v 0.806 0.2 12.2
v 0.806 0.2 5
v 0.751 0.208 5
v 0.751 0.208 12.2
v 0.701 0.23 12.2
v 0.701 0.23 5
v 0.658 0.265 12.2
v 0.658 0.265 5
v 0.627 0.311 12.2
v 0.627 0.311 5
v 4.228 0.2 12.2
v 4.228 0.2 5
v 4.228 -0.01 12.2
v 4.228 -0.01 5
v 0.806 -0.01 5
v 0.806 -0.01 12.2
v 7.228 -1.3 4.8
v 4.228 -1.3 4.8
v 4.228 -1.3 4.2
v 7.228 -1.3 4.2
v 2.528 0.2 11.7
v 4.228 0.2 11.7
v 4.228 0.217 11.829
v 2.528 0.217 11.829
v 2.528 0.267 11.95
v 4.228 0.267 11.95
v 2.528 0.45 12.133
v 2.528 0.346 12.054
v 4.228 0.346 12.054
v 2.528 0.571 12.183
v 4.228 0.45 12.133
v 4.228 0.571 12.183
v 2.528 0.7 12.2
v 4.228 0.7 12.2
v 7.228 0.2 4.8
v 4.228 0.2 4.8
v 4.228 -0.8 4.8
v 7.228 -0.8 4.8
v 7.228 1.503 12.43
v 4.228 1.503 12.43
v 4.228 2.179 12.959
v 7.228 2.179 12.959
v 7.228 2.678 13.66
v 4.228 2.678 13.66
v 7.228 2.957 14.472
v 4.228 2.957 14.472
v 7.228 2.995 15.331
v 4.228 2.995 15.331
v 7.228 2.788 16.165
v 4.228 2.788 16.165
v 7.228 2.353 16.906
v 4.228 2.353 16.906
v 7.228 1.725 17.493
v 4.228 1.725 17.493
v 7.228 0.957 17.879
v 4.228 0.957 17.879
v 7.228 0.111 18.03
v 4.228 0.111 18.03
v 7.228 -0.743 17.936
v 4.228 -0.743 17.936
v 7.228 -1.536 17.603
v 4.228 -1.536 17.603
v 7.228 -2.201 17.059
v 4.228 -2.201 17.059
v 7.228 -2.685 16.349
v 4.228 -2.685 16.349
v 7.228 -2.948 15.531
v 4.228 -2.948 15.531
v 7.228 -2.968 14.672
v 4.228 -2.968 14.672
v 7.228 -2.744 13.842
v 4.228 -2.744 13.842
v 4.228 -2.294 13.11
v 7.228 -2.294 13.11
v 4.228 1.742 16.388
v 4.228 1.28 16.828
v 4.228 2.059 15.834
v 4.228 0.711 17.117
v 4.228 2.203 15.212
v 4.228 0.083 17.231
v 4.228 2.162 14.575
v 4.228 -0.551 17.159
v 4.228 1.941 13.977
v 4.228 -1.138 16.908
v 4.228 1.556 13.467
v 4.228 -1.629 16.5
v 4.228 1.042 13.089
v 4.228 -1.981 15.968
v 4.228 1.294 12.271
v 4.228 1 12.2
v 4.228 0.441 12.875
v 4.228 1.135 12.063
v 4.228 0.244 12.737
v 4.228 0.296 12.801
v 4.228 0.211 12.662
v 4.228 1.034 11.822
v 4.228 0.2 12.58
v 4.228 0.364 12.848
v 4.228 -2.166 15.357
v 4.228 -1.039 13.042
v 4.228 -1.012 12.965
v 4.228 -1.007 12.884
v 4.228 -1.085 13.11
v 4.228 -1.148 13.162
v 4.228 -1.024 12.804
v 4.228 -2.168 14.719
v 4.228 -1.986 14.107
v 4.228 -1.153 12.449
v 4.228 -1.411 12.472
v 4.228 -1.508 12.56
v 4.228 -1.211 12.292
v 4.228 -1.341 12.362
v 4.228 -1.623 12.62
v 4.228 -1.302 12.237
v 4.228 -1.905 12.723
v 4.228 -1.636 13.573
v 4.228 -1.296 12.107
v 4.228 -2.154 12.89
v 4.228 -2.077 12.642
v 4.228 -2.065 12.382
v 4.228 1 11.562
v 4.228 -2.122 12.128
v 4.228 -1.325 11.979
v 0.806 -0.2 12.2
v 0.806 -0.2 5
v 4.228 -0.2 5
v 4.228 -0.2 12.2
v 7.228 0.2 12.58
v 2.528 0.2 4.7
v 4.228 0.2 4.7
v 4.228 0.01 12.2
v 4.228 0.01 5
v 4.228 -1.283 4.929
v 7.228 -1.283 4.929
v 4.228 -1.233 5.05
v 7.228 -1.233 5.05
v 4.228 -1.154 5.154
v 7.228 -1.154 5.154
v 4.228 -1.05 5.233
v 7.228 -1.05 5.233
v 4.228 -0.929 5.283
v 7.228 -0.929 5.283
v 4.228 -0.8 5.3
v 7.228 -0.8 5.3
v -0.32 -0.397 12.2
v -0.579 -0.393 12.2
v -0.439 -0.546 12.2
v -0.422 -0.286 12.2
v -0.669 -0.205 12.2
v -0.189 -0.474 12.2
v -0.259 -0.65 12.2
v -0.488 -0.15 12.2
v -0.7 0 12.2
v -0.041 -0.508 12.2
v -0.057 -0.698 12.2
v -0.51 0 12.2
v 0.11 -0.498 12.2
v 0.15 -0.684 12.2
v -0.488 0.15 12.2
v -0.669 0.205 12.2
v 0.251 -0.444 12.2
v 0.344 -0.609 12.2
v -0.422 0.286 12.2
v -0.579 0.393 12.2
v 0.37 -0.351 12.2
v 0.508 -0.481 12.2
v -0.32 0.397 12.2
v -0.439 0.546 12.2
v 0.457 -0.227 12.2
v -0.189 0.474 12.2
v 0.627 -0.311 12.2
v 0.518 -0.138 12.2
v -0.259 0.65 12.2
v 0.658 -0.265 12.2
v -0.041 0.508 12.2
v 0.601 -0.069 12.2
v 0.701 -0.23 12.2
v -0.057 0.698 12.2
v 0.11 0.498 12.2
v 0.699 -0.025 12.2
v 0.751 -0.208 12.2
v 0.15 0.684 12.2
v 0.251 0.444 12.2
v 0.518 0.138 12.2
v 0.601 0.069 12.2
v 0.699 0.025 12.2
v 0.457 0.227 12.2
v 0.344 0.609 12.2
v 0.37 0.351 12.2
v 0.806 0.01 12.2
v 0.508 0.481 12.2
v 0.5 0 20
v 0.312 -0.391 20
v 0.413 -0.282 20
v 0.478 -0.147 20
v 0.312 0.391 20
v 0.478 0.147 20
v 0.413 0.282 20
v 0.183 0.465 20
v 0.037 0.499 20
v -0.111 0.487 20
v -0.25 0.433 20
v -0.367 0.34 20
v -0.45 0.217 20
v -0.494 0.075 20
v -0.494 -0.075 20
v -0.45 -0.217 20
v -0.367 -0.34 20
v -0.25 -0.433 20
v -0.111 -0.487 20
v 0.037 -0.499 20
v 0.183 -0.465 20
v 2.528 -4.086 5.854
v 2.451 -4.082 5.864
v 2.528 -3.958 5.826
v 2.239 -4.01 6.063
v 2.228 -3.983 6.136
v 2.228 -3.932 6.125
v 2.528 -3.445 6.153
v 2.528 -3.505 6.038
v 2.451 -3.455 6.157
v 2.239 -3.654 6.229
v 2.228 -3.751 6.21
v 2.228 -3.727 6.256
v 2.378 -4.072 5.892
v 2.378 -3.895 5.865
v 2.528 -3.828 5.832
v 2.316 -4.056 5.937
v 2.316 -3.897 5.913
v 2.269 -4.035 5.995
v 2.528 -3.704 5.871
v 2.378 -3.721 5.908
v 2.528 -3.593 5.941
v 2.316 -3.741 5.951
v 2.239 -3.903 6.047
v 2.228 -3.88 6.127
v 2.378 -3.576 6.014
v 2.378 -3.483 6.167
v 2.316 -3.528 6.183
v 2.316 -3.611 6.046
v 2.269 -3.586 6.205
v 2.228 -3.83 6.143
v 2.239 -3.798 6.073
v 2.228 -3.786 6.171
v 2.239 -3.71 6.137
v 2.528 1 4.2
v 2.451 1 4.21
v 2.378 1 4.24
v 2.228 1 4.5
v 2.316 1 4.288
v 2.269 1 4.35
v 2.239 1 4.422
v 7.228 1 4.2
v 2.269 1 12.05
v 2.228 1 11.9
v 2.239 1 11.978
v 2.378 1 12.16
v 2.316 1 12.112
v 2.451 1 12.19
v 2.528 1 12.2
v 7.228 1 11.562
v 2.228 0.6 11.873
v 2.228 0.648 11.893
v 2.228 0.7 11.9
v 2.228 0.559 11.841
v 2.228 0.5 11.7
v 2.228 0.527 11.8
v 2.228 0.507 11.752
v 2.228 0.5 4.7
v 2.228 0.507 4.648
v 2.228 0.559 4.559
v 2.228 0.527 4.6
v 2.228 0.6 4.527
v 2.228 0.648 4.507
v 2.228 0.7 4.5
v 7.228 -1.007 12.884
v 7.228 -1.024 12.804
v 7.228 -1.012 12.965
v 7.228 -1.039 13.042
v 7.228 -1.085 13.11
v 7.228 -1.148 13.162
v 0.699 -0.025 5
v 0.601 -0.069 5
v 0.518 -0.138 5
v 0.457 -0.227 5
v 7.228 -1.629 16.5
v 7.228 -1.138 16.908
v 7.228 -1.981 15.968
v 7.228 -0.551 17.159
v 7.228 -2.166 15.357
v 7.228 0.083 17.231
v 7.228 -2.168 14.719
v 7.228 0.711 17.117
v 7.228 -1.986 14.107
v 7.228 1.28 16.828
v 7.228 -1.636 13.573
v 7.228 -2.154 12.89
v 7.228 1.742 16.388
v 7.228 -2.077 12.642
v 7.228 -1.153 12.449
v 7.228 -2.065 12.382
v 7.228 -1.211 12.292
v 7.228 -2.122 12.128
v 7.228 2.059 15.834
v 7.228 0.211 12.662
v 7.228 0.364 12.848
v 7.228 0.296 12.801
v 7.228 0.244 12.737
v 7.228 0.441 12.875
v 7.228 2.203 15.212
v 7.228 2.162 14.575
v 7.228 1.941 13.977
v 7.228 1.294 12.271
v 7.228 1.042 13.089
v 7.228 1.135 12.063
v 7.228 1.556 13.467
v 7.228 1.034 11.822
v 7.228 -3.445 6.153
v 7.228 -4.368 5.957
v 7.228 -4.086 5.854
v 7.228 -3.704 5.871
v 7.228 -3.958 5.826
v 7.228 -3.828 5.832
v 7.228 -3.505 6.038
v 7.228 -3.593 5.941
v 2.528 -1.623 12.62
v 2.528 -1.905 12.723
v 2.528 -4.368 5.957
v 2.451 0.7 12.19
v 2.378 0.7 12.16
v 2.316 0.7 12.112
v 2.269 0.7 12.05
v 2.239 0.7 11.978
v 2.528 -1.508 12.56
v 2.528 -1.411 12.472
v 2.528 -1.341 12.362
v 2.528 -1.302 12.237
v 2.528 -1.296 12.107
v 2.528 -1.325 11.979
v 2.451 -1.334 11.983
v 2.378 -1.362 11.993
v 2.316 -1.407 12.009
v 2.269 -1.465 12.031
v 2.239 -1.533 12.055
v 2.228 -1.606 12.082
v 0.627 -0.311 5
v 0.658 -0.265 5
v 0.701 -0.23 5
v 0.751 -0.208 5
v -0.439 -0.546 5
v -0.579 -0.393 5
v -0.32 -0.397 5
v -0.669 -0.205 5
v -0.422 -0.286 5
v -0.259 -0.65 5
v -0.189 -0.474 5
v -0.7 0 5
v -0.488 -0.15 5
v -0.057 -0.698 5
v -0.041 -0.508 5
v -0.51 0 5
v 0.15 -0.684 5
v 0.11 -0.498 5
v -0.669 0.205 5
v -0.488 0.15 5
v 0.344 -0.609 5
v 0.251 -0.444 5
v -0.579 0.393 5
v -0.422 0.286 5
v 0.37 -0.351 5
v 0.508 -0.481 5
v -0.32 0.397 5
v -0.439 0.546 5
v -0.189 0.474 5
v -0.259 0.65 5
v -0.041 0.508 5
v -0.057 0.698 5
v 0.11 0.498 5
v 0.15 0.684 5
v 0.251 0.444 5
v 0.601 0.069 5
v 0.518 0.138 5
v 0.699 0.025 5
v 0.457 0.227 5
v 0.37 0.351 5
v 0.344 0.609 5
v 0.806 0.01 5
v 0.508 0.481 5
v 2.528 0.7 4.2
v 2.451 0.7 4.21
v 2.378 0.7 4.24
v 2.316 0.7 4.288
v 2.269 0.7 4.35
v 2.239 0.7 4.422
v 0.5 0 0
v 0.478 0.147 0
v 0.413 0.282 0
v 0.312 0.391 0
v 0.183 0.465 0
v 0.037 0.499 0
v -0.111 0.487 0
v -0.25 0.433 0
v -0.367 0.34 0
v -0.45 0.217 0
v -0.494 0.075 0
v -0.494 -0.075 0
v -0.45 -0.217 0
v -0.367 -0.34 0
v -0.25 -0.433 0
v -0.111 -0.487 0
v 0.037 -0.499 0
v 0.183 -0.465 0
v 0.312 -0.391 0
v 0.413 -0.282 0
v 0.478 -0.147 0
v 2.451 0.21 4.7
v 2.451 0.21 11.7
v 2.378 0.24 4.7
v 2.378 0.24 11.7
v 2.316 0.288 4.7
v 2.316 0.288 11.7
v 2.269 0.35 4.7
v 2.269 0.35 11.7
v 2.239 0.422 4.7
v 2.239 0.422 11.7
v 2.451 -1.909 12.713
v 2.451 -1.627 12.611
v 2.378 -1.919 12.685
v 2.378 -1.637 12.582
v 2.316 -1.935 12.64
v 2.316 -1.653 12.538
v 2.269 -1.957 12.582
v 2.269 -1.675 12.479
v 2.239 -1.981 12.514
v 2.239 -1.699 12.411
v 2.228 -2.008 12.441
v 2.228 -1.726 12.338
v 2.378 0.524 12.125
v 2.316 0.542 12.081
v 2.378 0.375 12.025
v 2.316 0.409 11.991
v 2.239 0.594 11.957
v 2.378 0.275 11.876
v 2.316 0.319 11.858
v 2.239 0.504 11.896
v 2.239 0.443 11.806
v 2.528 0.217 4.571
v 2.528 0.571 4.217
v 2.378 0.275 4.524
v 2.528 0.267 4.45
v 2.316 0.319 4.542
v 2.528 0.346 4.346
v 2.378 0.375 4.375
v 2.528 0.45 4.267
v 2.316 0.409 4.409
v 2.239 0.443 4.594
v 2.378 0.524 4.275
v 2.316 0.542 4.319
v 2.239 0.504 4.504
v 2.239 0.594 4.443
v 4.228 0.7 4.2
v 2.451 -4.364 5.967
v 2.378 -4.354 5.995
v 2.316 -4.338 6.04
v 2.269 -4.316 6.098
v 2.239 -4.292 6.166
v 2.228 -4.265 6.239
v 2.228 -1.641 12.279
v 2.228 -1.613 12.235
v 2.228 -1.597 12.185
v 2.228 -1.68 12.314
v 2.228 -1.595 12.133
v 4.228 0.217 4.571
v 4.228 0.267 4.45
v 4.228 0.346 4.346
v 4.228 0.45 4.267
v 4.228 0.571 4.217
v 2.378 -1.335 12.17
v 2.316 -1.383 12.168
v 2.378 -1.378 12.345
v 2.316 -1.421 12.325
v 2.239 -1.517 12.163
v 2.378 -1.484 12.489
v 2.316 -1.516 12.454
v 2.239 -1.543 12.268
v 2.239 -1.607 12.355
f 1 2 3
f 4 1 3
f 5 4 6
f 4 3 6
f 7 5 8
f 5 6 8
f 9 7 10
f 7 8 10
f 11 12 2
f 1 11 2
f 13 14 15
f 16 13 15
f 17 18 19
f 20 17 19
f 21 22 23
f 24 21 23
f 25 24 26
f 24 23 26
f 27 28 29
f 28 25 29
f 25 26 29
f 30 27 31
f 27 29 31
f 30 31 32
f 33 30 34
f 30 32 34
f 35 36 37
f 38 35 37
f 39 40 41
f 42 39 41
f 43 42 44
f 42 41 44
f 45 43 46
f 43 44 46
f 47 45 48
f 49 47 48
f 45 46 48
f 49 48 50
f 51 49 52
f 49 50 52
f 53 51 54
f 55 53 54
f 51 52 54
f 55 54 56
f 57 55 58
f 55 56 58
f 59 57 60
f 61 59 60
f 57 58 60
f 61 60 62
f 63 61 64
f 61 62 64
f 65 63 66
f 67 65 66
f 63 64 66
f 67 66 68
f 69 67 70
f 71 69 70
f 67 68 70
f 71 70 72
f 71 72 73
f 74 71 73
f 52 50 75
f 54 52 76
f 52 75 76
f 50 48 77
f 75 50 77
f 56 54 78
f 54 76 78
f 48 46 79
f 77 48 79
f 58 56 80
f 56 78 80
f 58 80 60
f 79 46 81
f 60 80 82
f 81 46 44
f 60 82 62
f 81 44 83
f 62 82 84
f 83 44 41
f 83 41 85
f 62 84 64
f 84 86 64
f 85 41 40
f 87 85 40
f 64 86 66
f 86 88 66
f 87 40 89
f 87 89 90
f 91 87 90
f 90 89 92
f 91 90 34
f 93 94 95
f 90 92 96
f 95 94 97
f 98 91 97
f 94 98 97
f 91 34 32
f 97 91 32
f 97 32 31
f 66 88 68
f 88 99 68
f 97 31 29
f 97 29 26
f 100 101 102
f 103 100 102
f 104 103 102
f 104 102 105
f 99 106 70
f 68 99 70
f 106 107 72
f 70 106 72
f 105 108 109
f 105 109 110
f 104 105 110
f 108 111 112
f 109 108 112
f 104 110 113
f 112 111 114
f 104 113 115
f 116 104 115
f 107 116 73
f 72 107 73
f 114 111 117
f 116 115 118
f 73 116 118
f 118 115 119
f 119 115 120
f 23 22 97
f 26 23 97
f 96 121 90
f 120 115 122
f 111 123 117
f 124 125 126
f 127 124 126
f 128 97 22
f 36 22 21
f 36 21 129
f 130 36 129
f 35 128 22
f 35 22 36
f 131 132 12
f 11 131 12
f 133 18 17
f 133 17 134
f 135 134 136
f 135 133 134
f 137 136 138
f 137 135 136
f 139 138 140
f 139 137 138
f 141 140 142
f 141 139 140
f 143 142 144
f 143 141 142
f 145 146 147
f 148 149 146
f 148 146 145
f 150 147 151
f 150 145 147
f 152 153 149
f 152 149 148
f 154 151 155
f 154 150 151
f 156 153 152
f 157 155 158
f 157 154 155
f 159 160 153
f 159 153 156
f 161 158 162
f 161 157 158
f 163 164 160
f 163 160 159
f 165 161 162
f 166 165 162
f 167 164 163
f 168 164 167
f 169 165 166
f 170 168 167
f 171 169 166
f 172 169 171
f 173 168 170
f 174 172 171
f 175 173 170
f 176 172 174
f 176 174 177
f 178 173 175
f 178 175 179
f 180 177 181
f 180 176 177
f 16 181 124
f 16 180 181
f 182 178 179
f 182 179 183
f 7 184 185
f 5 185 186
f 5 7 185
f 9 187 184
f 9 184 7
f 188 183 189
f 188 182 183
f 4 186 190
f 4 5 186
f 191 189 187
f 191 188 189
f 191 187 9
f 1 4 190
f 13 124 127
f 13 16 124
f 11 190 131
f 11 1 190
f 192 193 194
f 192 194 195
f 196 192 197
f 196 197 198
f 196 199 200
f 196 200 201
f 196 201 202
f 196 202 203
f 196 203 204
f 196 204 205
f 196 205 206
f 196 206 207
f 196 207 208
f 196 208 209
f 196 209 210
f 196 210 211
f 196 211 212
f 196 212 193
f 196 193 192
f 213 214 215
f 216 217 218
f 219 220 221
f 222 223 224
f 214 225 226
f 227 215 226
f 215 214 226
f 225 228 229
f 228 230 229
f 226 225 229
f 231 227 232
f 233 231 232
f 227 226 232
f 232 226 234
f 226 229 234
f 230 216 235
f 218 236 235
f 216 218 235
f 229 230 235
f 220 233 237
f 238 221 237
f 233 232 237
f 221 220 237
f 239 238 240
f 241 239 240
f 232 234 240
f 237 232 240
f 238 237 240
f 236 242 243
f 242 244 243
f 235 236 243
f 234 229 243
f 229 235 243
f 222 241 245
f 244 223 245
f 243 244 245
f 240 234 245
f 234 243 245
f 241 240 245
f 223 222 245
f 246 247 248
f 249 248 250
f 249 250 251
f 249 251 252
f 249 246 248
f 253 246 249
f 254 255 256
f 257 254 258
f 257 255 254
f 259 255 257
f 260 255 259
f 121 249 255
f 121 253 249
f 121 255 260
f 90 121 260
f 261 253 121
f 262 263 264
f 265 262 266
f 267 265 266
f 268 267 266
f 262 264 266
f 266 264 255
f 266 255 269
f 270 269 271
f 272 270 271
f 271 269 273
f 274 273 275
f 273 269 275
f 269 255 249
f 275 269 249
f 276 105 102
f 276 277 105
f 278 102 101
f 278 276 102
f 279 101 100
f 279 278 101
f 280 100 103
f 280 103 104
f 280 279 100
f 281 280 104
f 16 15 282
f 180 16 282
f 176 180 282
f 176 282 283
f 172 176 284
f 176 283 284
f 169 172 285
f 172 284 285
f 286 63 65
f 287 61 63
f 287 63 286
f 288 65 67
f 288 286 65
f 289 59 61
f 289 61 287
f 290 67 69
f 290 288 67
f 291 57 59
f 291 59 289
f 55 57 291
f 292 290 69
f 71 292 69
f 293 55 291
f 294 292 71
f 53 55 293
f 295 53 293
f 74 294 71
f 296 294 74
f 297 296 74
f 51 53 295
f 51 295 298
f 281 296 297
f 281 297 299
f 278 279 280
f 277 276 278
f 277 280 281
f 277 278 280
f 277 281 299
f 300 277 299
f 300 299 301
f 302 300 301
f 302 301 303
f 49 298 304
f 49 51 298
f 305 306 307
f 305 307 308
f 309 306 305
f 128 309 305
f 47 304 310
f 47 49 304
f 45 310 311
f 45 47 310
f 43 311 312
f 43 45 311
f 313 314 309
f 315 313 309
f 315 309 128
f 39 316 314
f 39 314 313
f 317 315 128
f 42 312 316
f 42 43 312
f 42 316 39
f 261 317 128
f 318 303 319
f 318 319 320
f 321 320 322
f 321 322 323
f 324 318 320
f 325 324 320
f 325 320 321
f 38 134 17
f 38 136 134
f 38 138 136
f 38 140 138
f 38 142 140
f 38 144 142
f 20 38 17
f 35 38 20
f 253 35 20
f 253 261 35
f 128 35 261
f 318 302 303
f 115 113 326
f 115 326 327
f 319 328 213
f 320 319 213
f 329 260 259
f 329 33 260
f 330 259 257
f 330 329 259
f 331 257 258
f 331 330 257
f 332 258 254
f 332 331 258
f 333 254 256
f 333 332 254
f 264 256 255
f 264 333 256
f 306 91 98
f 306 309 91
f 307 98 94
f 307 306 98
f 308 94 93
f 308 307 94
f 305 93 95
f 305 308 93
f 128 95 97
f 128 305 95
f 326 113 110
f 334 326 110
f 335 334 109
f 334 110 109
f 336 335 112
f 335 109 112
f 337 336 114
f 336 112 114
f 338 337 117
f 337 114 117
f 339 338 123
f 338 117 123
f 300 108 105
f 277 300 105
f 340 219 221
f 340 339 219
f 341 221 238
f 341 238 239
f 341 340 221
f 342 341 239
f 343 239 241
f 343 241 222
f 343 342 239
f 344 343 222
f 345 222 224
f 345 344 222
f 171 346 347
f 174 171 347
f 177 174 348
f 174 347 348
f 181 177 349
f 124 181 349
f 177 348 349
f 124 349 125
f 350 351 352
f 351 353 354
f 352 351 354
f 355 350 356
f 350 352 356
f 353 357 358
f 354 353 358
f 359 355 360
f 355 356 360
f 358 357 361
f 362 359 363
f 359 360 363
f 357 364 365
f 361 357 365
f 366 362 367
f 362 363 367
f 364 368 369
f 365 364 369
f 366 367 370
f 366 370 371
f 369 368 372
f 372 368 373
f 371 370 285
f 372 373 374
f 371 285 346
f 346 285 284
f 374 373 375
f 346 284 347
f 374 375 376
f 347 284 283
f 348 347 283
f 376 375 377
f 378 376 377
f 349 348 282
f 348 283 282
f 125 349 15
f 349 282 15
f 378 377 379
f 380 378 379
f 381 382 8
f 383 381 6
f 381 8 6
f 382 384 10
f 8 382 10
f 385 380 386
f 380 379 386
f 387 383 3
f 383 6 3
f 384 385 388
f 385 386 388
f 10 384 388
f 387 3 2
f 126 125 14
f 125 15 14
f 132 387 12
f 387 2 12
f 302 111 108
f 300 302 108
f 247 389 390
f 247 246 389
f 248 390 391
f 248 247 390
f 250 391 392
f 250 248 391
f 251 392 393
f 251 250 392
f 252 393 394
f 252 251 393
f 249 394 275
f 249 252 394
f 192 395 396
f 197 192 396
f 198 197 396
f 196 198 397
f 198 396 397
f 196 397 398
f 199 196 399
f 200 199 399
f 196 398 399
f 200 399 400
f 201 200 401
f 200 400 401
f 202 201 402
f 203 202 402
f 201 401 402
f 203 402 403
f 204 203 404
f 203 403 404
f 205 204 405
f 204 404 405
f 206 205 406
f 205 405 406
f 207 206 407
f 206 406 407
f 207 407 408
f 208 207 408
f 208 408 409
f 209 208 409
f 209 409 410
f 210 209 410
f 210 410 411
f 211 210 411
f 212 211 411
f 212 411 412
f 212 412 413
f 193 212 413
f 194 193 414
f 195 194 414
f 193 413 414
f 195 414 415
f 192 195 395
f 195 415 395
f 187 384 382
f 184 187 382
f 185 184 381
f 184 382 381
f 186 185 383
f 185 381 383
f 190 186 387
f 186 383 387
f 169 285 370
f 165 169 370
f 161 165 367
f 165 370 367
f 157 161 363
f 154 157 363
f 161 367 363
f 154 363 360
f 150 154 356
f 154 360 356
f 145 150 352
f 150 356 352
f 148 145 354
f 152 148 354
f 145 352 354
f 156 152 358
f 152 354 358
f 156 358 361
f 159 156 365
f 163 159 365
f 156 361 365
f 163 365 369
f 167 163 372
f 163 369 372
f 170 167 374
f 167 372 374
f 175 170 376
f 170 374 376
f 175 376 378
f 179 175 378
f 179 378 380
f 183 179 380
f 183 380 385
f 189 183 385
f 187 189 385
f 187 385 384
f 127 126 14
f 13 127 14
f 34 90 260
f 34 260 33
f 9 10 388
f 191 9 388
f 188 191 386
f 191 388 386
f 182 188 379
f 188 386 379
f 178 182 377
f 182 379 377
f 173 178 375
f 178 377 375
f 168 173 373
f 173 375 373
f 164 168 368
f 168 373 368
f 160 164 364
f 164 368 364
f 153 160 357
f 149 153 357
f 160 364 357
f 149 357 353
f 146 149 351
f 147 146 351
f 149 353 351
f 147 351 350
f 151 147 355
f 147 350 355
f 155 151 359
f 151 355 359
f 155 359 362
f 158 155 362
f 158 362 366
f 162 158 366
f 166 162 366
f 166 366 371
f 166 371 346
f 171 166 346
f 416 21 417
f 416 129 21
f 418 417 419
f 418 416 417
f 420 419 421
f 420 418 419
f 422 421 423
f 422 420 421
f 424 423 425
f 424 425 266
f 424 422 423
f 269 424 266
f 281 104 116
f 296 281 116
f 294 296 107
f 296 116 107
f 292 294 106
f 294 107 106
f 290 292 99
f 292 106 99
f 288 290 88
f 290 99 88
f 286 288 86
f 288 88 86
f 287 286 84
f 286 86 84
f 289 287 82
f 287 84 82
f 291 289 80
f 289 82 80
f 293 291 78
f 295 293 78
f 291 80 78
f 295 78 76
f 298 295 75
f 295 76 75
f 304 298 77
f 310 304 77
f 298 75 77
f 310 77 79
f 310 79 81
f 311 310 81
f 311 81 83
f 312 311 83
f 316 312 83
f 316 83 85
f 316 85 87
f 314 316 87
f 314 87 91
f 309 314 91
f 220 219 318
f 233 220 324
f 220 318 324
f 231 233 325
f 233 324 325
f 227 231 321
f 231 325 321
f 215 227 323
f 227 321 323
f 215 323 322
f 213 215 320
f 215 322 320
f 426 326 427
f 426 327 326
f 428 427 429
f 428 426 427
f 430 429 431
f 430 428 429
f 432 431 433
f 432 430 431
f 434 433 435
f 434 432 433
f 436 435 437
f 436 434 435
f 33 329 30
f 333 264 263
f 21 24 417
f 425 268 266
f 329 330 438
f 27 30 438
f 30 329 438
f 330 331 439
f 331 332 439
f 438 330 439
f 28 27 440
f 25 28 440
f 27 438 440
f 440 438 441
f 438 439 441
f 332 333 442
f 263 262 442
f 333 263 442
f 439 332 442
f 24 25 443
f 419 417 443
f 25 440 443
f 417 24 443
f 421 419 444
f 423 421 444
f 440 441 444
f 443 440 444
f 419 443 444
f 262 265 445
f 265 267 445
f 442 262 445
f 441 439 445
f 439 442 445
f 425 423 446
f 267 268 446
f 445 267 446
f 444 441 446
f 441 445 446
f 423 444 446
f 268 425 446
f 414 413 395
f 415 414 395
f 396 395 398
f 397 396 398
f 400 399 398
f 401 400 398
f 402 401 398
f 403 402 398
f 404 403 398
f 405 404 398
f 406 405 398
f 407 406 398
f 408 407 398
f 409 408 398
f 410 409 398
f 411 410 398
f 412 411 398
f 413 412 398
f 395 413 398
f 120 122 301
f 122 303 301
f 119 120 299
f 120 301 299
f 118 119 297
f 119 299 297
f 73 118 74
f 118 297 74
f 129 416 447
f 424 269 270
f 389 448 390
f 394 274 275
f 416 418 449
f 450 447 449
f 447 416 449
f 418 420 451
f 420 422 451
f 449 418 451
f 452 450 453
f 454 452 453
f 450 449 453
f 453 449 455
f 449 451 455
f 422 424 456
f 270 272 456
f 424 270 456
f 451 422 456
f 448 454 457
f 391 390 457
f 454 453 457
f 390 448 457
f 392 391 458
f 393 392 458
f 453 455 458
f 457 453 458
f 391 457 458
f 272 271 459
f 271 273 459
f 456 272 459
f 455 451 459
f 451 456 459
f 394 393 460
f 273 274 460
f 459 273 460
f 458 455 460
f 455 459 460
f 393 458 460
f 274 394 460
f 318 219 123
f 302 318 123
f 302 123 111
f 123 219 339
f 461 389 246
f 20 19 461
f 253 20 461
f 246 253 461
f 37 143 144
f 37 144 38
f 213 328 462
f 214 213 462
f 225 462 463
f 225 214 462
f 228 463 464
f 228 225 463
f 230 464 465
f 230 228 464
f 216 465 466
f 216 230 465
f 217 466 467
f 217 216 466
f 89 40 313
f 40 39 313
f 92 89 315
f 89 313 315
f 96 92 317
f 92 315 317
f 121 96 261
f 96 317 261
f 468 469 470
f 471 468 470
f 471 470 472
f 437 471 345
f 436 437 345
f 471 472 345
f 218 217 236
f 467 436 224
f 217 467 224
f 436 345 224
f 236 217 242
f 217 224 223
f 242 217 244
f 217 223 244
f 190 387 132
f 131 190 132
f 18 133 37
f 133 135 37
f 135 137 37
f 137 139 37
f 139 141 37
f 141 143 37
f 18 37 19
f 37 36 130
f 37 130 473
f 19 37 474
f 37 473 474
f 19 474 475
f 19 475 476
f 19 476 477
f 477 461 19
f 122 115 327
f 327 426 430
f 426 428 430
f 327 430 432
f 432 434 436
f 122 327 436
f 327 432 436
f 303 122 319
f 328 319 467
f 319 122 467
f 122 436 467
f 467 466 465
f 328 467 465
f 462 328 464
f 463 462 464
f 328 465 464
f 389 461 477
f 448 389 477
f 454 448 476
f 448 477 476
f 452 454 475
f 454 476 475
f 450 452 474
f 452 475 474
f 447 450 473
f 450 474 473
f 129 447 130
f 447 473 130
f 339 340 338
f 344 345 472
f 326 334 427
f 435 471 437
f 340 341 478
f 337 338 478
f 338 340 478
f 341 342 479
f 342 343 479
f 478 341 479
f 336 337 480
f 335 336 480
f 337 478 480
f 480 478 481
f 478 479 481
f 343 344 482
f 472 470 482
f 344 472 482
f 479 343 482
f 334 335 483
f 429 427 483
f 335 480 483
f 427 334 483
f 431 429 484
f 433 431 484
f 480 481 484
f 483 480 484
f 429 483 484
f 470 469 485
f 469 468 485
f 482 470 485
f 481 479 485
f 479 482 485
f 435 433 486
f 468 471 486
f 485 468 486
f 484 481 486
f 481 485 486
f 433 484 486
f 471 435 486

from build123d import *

# Parameters (mm, degrees)
SKETCH1_R           = 0.5
BOSS_EXTRUDE1_DEPTH = 20
EXTRUDE_THIN1_DEPTH = 7.2
BOSS_EXTRUDE2_DEPTH = 3
BOSS_EXTRUDE3_DEPTH = 2
FILLET2_R           = 0.5
FILLET3_R           = 1
FILLET4_R           = 0.3
FILLET5_R           = 0.3


with BuildPart() as part:
    # Sketch1 → Boss-Extrude1 (new body)
    with BuildSketch(Plane.XY):
        Circle(SKETCH1_R)
    extrude(amount=BOSS_EXTRUDE1_DEPTH)


with BuildPart() as body_2:
    # Sketch3 → Extrude-Thin1 (new body)
    with BuildSketch(Plane(origin=(0, 0, 5), x_dir=(-1, 0, 0), z_dir=(0, 0, -1))):
        with BuildLine():
            Line((-4.228476287639893, 0.19999999999999948), (-0.8062257748298554, 0.19999999999999948))
            ThreePointArc((-0.8062257748298554, 0.19999999999999948), (-0.7008165194909093, 0.23003268288024017), (-0.6270644915343319, 0.31111111111111067))
            ThreePointArc((-0.6270644915343319, 0.31111111111111067), (0.7000000000000001, 2e-17), (-0.6270644915343316, -0.31111111111111117))
            ThreePointArc((-0.6270644915343316, -0.31111111111111117), (-0.7008165194909091, -0.23003268288024095), (-0.806225774829855, -0.2000000000000001))
            Line((-0.806225774829855, -0.2000000000000001), (-4.228476287639893, -0.2000000000000005))
            Line((-4.228476287639893, -0.2000000000000005), (-4.228476287639893, -0.01000000000000051))
            Line((-4.228476287639893, -0.01000000000000051), (-0.806225774829855, -0.01000000000000009))
            ThreePointArc((-0.8062257748298561, -0.00999999999999929), (-0.6006777269189111, -0.068563731616469), (-0.4568612724035847, -0.22666666666666638))
            ThreePointArc((-0.4568612724035845, -0.22666666666666677), (0.51, -2e-17), (-0.45686127240358465, 0.22666666666666627))
            ThreePointArc((-0.4568612724035848, 0.22666666666666602), (-0.600677726918911, 0.0685637316164685), (-0.8062257748298558, 0.00999999999999912))
            Line((-0.8062257748298554, 0.00999999999999948), (-4.228476287639893, 0.00999999999999948))
            Line((-4.228476287639893, 0.00999999999999948), (-4.228476287639893, 0.19999999999999948))
        make_face()
    extrude(amount=-EXTRUDE_THIN1_DEPTH)


with BuildPart() as body_3:
    # Sketch5 → Boss-Extrude2 (new body)
    with BuildSketch(Plane(origin=(4.228476287639893, 0, 0), x_dir=(0, 0, -1), z_dir=(1, 0, 0))):
        with BuildLine():
            ThreePointArc((-5.300000000000001, -0.8000000000000005), (-5.153553390593275, -1.1535533905932744), (-4.800000000000001, -1.300000000000001))
            Line((-4.800000000000001, -1.3000000000000007), (-4.2, -1.3000000000000007))
            Line((-4.2, -1.3000000000000007), (-4.2, 1))
            Line((-4.2, 0.9999999999999998), (-12.199999999999998, 0.9999999999999987))
            ThreePointArc((-12.2, 0.9999999999999983), (-17.984505771338654, 0.5413867488476434), (-12.72287206983638, -1.9052525633514834))
            Line((-12.722872069836379, -1.9052525633514832), (-5.957085200177842, -4.367797595296302))
            Line((-5.957085200177842, -4.367797595296302), (-5.683469085517308, -3.6160434986675747))
            Line((-5.683469085517308, -3.6160434986675747), (-13.045883095395867, -0.9363439467272978))
            ThreePointArc((-13.045883095395869, -0.9363439467272983), (-17.196753581769194, 0.4019110383209302), (-12.84016269757365, 0.19999999999999932))
            Line((-12.840162697573648, 0.1999999999999994), (-4.800000000000001, 0.19999999999999948))
            Line((-4.800000000000001, 0.1999999999999995), (-4.800000000000001, -0.8000000000000004))
            Line((-4.800000000000001, -0.8000000000000004), (-5.300000000000001, -0.8000000000000004))
        make_face()
    extrude(amount=BOSS_EXTRUDE2_DEPTH)

    # Sketch5<3> → Boss-Extrude3 (add)
    with BuildSketch(Plane(origin=(4.228476287639893, 0, 0), x_dir=(0, 0, -1), z_dir=(1, 0, 0))):
        Polygon((-4.2, 0.19999999999999948), (-4.2, 0.9999999999999996), (-12.199999999999998, 0.9999999999999987), (-12.2, 0.19999999999999948), align=None)
        Polygon((-12.449255955175843, -1.153498466722756), (-12.722872069836379, -1.9052525633514832), (-5.957085200177842, -4.367797595296302), (-5.683469085517308, -3.6160434986675747), align=None)
    extrude(amount=-BOSS_EXTRUDE3_DEPTH)

    # Fillet2
    fillet2_edges = [body_3.edges().sort_by_distance(p)[0] for p in [
        (4.728476287639893, -3.6160434986675747, 5.683469085517308),
        (3.228476287639893, 0.19999999999999948, 4.2),
        (3.228476287639893, 0.19999999999999948, 12.2),
        (3.228476287639893, -1.153498466722756, 12.449255955175843),
    ]]
    fillet(fillet2_edges, radius=FILLET2_R)

    # Fillet3
    fillet3_edges = [body_3.edges().sort_by_distance(p)[0] for p in [
        (5.728476287639893, 0.9999999999999987, 12.2),
        (5.728476287639893, -1.9052525633514845, 12.72287206983638),
    ]]
    fillet(fillet3_edges, radius=FILLET3_R)

    # Fillet4
    fillet4_edges = [body_3.edges().sort_by_distance(p)[0] for p in [
        (2.228476287639893, 0.8499999999999994, 4.2),
        (2.228476287639893, 0.34644660940672556, 4.346446609406727),
        (2.228476287639893, 0.849999999999999, 12.2),
        (2.228476287639893, 0.3464466094067255, 12.053553390593272),
        (2.228476287639893, -1.764298670233596, 12.671569048337528),
        (2.228476287639893, -1.3412009552602184, 12.361728847316073),
        (2.228476287639893, -4.2268437021784155, 5.905782178678991),
        (2.228476287639893, -3.7035706065273453, 5.87117157405477),
        (2.228476287639893, 0.19999999999999948, 8.2),
        (2.228476287639893, -2.3847709826951657, 9.066362520346575),
    ]]
    fillet(fillet4_edges, radius=FILLET4_R)

    # Fillet5
    fillet5_edges = [body_3.edges().sort_by_distance(p)[0] for p in [
        (5.728476287639893, -0.9363439467272981, 13.045883095395869),
        (5.728476287639893, 0.19999999999999957, 12.84016269757365),
    ]]
    fillet(fillet5_edges, radius=FILLET5_R)


solid = Compound([part.part, body_2.part, body_3.part])
